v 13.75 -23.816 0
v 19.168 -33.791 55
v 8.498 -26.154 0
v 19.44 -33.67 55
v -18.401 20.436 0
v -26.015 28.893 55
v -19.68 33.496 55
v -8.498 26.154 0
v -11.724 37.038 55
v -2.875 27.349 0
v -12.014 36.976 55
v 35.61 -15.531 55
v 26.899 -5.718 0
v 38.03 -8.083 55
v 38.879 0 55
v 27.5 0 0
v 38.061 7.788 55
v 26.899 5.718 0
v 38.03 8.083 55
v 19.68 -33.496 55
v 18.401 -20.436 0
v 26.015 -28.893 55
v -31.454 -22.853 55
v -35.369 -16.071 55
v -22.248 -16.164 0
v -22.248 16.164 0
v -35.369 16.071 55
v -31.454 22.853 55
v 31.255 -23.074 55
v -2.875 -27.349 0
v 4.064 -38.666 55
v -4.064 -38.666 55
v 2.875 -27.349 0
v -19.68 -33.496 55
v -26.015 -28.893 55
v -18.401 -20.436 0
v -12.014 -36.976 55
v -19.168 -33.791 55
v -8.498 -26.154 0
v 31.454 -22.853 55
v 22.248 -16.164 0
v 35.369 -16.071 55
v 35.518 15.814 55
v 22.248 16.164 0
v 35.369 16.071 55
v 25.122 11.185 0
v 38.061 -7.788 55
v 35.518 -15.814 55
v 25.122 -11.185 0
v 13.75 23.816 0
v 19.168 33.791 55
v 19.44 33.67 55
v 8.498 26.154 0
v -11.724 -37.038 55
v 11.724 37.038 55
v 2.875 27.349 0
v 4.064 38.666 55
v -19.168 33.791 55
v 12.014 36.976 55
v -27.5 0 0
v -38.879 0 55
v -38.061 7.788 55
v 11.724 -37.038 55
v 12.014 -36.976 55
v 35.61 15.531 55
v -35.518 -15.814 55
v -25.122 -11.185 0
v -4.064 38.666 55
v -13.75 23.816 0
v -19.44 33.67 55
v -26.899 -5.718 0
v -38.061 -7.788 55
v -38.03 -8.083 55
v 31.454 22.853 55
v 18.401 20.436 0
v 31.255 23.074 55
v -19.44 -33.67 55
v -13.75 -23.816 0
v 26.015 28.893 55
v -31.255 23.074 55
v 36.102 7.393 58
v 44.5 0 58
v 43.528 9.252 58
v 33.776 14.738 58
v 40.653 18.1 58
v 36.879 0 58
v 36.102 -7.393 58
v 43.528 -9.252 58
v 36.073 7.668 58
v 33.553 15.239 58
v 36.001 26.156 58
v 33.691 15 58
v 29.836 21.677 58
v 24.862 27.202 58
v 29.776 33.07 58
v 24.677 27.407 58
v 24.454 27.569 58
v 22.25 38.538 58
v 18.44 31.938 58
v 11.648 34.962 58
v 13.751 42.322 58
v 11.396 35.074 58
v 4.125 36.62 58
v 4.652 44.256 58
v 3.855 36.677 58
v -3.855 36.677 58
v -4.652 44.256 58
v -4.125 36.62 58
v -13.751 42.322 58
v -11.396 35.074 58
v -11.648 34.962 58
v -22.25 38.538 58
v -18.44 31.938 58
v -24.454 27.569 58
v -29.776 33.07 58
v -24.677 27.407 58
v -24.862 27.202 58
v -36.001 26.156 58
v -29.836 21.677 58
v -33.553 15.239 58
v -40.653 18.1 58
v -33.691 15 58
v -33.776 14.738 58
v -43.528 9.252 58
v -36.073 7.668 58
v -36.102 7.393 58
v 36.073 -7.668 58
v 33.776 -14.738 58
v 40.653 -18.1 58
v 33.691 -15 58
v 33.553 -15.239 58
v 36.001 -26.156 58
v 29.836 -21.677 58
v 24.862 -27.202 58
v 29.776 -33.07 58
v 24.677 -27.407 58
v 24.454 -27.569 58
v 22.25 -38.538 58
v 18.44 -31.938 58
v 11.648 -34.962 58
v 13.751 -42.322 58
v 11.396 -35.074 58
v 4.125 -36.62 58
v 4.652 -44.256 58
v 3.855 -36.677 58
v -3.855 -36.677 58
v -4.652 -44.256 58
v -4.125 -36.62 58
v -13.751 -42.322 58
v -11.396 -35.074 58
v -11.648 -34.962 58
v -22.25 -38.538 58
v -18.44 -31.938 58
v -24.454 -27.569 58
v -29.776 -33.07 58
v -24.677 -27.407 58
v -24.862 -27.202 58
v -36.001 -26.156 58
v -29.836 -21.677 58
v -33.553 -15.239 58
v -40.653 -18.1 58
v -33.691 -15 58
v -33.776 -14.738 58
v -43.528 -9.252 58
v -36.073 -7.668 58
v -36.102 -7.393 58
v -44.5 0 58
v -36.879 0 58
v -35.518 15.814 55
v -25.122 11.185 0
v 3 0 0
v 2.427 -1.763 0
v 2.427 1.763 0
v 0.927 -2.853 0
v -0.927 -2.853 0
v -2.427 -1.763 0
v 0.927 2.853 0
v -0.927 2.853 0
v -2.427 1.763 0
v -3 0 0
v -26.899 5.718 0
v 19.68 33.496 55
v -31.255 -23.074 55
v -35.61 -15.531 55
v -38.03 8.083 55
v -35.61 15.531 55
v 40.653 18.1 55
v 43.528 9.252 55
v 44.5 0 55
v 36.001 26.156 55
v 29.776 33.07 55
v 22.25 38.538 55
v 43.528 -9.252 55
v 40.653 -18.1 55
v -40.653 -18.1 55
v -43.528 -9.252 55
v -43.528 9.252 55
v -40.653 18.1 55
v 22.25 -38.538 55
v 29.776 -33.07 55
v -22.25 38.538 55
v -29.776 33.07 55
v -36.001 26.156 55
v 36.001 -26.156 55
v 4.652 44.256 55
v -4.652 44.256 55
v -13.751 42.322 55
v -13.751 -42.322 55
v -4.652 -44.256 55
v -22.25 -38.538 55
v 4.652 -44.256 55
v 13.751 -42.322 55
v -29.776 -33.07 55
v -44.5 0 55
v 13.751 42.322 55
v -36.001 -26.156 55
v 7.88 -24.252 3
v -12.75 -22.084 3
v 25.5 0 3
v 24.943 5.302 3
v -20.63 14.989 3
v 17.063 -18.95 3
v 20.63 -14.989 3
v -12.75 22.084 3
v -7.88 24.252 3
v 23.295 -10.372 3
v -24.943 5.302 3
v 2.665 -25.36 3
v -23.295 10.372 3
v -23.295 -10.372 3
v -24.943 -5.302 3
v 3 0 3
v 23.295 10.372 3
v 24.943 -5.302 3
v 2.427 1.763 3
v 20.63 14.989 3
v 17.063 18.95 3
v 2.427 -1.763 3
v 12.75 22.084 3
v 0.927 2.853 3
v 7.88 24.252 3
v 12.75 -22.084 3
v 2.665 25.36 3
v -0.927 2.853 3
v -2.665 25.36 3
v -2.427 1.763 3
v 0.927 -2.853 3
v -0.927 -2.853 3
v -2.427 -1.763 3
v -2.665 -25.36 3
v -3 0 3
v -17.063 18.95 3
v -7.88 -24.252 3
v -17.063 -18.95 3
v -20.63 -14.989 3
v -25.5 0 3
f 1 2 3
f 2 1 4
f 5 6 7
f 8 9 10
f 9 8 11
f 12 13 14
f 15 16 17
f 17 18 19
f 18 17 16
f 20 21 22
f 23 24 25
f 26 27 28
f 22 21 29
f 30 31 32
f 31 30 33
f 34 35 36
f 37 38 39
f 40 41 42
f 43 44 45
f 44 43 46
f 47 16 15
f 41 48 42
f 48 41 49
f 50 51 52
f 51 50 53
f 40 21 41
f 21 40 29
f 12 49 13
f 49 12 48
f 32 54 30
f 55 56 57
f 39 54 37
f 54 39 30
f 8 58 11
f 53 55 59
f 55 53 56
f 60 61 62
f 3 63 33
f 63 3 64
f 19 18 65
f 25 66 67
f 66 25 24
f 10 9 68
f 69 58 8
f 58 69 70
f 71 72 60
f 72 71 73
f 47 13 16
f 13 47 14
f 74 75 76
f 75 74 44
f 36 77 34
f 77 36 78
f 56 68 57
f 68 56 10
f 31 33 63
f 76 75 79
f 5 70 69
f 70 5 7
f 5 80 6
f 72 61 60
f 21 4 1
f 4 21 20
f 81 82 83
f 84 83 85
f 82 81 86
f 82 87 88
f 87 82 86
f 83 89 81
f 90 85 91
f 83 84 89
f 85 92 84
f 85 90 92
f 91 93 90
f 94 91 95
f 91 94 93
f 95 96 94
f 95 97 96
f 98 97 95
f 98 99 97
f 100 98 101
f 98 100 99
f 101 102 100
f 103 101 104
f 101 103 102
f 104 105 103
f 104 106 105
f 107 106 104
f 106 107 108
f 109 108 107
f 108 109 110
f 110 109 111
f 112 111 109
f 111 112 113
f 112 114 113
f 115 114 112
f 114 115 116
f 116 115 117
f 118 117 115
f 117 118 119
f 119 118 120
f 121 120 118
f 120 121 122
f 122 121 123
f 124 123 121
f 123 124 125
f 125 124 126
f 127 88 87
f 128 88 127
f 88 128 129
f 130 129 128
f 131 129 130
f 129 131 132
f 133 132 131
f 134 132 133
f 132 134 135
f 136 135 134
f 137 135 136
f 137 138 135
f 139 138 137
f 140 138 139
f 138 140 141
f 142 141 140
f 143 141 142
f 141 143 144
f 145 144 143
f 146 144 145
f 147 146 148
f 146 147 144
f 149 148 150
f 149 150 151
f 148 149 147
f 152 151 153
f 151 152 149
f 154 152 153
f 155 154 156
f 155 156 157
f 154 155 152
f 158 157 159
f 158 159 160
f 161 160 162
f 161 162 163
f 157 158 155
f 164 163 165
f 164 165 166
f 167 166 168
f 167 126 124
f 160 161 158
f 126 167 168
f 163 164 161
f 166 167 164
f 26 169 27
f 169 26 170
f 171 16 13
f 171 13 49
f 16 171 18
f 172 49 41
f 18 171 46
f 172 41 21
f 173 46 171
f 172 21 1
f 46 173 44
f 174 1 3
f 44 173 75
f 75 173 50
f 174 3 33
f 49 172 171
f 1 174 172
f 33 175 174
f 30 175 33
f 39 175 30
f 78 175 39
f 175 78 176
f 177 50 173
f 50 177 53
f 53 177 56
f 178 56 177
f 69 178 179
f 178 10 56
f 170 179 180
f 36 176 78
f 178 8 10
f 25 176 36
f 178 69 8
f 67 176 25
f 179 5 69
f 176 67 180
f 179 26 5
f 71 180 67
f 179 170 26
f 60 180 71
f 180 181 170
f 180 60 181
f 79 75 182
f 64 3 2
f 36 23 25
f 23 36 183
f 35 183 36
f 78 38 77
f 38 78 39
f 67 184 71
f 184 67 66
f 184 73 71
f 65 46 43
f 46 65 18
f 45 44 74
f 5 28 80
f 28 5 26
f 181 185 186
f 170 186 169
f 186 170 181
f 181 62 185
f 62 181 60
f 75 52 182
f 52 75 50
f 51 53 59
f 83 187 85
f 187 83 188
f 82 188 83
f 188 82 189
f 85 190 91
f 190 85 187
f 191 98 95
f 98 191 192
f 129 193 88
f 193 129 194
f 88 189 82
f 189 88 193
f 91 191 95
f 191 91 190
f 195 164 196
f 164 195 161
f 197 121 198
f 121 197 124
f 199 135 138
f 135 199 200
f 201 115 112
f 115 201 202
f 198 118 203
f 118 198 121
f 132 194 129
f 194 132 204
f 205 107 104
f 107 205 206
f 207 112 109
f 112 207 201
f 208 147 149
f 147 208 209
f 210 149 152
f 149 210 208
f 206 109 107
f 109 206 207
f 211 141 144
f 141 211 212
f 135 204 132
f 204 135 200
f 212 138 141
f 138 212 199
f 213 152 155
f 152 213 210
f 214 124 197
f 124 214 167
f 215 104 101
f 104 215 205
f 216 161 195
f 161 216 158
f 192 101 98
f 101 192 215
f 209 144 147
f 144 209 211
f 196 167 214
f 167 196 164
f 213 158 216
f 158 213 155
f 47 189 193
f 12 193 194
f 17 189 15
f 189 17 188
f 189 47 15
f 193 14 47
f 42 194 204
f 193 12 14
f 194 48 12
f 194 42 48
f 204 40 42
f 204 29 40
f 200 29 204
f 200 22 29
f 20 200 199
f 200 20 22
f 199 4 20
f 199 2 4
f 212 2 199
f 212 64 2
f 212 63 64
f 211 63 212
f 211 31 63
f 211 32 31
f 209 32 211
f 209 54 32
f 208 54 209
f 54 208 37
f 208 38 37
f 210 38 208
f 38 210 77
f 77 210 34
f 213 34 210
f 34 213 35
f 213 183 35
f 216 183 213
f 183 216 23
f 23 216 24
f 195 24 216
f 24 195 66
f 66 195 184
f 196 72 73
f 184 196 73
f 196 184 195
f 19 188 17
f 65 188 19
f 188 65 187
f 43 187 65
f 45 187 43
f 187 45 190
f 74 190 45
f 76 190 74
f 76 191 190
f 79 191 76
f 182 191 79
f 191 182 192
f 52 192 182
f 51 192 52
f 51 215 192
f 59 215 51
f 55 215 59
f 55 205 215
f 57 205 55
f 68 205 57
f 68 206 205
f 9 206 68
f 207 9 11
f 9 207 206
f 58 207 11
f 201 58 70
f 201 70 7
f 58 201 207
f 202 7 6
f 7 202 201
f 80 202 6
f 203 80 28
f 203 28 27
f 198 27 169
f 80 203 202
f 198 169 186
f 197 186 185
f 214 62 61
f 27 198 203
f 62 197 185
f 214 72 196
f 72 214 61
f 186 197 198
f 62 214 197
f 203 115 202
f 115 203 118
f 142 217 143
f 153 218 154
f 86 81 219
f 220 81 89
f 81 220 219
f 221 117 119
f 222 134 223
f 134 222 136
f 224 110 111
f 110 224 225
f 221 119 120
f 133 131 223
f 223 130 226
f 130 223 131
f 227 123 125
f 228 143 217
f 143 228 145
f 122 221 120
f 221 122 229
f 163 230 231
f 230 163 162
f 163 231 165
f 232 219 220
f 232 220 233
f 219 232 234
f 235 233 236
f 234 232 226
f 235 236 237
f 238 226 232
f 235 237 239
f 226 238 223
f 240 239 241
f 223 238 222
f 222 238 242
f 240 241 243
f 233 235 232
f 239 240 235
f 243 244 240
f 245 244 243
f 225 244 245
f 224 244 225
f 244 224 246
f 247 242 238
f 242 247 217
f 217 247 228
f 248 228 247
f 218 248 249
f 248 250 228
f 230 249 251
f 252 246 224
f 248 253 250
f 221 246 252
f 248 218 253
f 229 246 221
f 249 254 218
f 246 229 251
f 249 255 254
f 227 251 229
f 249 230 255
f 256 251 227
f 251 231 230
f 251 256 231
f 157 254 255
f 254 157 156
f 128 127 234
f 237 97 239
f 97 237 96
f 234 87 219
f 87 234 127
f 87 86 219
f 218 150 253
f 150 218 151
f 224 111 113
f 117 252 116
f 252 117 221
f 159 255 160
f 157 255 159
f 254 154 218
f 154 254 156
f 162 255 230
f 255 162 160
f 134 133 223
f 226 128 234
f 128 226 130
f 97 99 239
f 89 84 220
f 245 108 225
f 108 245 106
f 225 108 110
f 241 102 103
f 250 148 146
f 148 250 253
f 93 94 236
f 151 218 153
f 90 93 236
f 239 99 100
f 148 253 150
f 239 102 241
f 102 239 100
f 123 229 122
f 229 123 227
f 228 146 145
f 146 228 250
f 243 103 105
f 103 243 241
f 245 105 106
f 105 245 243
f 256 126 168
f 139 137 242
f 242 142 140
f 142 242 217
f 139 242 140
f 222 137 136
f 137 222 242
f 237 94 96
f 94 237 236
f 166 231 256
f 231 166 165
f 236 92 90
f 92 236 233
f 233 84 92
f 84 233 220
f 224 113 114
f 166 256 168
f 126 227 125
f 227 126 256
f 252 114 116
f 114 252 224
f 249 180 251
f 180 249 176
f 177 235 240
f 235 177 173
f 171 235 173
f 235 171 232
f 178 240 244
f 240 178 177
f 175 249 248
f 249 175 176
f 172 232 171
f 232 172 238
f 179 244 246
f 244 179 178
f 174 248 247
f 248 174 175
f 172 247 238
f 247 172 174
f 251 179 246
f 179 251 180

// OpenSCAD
//---------------------------------------------------------------- GLOBALS

//-------------------------------------------------- Yogurt Container
//these are the values for the container itself
yc_bottom_e_radius = 56/2; 
yc_top_e_radius = 80/2;
yc_wall_thickness = 0.5;
yc_floor_thickness = yc_wall_thickness;
yc_bottom_i_radius = yc_bottom_e_radius-yc_wall_thickness; 
yc_top_i_radius = yc_top_e_radius-yc_wall_thickness;
yc_height = 82.5+yc_floor_thickness;  // 55/82.5 = 2/3

//---------------------------------------------------- Basket Insert
////these are the values for the basket that turns it into a SIP
sip_bottom_radius = yc_bottom_i_radius;

//exchange these two lines to give the cup a canted side
//sip_top_radius = sip_bottom_radius;
sip_top_radius = yc_top_i_radius;

sip_height = ((yc_height-yc_floor_thickness)/3)*2;
sip_lip_radius = yc_top_i_radius + 5;
sip_wick_radius = 3;
sip_wall_thickness = 2;
sip_floor_thickness = 3;
sip_lip_thickness = sip_floor_thickness;

//-------------------------------------------------- START yogurtCup_SIP()
module yogurtCup_SIP() {

	difference(){

		//add here
		union() {
			cylinder(r1=sip_bottom_radius, r2=sip_top_radius, h=sip_height+sip_lip_thickness);
			translate([0,0,sip_height]) {
				cylinder(r=sip_lip_radius, h=sip_lip_thickness);	
			}		
		}
		
		//take away here
		union() {
			translate([0,0,sip_floor_thickness]) {
				cylinder(r=sip_bottom_radius-sip_wall_thickness, r2=sip_top_radius-sip_wall_thickness, h=sip_height+sip_lip_thickness);
			}
			translate([0,0,-sip_floor_thickness]) {
				cylinder(r=sip_wick_radius, h=sip_floor_thickness*3);
			}

		}
	}

}
//---------------------------------------------------- END yogurtCup_SIP()



yogurtCup_SIP();
